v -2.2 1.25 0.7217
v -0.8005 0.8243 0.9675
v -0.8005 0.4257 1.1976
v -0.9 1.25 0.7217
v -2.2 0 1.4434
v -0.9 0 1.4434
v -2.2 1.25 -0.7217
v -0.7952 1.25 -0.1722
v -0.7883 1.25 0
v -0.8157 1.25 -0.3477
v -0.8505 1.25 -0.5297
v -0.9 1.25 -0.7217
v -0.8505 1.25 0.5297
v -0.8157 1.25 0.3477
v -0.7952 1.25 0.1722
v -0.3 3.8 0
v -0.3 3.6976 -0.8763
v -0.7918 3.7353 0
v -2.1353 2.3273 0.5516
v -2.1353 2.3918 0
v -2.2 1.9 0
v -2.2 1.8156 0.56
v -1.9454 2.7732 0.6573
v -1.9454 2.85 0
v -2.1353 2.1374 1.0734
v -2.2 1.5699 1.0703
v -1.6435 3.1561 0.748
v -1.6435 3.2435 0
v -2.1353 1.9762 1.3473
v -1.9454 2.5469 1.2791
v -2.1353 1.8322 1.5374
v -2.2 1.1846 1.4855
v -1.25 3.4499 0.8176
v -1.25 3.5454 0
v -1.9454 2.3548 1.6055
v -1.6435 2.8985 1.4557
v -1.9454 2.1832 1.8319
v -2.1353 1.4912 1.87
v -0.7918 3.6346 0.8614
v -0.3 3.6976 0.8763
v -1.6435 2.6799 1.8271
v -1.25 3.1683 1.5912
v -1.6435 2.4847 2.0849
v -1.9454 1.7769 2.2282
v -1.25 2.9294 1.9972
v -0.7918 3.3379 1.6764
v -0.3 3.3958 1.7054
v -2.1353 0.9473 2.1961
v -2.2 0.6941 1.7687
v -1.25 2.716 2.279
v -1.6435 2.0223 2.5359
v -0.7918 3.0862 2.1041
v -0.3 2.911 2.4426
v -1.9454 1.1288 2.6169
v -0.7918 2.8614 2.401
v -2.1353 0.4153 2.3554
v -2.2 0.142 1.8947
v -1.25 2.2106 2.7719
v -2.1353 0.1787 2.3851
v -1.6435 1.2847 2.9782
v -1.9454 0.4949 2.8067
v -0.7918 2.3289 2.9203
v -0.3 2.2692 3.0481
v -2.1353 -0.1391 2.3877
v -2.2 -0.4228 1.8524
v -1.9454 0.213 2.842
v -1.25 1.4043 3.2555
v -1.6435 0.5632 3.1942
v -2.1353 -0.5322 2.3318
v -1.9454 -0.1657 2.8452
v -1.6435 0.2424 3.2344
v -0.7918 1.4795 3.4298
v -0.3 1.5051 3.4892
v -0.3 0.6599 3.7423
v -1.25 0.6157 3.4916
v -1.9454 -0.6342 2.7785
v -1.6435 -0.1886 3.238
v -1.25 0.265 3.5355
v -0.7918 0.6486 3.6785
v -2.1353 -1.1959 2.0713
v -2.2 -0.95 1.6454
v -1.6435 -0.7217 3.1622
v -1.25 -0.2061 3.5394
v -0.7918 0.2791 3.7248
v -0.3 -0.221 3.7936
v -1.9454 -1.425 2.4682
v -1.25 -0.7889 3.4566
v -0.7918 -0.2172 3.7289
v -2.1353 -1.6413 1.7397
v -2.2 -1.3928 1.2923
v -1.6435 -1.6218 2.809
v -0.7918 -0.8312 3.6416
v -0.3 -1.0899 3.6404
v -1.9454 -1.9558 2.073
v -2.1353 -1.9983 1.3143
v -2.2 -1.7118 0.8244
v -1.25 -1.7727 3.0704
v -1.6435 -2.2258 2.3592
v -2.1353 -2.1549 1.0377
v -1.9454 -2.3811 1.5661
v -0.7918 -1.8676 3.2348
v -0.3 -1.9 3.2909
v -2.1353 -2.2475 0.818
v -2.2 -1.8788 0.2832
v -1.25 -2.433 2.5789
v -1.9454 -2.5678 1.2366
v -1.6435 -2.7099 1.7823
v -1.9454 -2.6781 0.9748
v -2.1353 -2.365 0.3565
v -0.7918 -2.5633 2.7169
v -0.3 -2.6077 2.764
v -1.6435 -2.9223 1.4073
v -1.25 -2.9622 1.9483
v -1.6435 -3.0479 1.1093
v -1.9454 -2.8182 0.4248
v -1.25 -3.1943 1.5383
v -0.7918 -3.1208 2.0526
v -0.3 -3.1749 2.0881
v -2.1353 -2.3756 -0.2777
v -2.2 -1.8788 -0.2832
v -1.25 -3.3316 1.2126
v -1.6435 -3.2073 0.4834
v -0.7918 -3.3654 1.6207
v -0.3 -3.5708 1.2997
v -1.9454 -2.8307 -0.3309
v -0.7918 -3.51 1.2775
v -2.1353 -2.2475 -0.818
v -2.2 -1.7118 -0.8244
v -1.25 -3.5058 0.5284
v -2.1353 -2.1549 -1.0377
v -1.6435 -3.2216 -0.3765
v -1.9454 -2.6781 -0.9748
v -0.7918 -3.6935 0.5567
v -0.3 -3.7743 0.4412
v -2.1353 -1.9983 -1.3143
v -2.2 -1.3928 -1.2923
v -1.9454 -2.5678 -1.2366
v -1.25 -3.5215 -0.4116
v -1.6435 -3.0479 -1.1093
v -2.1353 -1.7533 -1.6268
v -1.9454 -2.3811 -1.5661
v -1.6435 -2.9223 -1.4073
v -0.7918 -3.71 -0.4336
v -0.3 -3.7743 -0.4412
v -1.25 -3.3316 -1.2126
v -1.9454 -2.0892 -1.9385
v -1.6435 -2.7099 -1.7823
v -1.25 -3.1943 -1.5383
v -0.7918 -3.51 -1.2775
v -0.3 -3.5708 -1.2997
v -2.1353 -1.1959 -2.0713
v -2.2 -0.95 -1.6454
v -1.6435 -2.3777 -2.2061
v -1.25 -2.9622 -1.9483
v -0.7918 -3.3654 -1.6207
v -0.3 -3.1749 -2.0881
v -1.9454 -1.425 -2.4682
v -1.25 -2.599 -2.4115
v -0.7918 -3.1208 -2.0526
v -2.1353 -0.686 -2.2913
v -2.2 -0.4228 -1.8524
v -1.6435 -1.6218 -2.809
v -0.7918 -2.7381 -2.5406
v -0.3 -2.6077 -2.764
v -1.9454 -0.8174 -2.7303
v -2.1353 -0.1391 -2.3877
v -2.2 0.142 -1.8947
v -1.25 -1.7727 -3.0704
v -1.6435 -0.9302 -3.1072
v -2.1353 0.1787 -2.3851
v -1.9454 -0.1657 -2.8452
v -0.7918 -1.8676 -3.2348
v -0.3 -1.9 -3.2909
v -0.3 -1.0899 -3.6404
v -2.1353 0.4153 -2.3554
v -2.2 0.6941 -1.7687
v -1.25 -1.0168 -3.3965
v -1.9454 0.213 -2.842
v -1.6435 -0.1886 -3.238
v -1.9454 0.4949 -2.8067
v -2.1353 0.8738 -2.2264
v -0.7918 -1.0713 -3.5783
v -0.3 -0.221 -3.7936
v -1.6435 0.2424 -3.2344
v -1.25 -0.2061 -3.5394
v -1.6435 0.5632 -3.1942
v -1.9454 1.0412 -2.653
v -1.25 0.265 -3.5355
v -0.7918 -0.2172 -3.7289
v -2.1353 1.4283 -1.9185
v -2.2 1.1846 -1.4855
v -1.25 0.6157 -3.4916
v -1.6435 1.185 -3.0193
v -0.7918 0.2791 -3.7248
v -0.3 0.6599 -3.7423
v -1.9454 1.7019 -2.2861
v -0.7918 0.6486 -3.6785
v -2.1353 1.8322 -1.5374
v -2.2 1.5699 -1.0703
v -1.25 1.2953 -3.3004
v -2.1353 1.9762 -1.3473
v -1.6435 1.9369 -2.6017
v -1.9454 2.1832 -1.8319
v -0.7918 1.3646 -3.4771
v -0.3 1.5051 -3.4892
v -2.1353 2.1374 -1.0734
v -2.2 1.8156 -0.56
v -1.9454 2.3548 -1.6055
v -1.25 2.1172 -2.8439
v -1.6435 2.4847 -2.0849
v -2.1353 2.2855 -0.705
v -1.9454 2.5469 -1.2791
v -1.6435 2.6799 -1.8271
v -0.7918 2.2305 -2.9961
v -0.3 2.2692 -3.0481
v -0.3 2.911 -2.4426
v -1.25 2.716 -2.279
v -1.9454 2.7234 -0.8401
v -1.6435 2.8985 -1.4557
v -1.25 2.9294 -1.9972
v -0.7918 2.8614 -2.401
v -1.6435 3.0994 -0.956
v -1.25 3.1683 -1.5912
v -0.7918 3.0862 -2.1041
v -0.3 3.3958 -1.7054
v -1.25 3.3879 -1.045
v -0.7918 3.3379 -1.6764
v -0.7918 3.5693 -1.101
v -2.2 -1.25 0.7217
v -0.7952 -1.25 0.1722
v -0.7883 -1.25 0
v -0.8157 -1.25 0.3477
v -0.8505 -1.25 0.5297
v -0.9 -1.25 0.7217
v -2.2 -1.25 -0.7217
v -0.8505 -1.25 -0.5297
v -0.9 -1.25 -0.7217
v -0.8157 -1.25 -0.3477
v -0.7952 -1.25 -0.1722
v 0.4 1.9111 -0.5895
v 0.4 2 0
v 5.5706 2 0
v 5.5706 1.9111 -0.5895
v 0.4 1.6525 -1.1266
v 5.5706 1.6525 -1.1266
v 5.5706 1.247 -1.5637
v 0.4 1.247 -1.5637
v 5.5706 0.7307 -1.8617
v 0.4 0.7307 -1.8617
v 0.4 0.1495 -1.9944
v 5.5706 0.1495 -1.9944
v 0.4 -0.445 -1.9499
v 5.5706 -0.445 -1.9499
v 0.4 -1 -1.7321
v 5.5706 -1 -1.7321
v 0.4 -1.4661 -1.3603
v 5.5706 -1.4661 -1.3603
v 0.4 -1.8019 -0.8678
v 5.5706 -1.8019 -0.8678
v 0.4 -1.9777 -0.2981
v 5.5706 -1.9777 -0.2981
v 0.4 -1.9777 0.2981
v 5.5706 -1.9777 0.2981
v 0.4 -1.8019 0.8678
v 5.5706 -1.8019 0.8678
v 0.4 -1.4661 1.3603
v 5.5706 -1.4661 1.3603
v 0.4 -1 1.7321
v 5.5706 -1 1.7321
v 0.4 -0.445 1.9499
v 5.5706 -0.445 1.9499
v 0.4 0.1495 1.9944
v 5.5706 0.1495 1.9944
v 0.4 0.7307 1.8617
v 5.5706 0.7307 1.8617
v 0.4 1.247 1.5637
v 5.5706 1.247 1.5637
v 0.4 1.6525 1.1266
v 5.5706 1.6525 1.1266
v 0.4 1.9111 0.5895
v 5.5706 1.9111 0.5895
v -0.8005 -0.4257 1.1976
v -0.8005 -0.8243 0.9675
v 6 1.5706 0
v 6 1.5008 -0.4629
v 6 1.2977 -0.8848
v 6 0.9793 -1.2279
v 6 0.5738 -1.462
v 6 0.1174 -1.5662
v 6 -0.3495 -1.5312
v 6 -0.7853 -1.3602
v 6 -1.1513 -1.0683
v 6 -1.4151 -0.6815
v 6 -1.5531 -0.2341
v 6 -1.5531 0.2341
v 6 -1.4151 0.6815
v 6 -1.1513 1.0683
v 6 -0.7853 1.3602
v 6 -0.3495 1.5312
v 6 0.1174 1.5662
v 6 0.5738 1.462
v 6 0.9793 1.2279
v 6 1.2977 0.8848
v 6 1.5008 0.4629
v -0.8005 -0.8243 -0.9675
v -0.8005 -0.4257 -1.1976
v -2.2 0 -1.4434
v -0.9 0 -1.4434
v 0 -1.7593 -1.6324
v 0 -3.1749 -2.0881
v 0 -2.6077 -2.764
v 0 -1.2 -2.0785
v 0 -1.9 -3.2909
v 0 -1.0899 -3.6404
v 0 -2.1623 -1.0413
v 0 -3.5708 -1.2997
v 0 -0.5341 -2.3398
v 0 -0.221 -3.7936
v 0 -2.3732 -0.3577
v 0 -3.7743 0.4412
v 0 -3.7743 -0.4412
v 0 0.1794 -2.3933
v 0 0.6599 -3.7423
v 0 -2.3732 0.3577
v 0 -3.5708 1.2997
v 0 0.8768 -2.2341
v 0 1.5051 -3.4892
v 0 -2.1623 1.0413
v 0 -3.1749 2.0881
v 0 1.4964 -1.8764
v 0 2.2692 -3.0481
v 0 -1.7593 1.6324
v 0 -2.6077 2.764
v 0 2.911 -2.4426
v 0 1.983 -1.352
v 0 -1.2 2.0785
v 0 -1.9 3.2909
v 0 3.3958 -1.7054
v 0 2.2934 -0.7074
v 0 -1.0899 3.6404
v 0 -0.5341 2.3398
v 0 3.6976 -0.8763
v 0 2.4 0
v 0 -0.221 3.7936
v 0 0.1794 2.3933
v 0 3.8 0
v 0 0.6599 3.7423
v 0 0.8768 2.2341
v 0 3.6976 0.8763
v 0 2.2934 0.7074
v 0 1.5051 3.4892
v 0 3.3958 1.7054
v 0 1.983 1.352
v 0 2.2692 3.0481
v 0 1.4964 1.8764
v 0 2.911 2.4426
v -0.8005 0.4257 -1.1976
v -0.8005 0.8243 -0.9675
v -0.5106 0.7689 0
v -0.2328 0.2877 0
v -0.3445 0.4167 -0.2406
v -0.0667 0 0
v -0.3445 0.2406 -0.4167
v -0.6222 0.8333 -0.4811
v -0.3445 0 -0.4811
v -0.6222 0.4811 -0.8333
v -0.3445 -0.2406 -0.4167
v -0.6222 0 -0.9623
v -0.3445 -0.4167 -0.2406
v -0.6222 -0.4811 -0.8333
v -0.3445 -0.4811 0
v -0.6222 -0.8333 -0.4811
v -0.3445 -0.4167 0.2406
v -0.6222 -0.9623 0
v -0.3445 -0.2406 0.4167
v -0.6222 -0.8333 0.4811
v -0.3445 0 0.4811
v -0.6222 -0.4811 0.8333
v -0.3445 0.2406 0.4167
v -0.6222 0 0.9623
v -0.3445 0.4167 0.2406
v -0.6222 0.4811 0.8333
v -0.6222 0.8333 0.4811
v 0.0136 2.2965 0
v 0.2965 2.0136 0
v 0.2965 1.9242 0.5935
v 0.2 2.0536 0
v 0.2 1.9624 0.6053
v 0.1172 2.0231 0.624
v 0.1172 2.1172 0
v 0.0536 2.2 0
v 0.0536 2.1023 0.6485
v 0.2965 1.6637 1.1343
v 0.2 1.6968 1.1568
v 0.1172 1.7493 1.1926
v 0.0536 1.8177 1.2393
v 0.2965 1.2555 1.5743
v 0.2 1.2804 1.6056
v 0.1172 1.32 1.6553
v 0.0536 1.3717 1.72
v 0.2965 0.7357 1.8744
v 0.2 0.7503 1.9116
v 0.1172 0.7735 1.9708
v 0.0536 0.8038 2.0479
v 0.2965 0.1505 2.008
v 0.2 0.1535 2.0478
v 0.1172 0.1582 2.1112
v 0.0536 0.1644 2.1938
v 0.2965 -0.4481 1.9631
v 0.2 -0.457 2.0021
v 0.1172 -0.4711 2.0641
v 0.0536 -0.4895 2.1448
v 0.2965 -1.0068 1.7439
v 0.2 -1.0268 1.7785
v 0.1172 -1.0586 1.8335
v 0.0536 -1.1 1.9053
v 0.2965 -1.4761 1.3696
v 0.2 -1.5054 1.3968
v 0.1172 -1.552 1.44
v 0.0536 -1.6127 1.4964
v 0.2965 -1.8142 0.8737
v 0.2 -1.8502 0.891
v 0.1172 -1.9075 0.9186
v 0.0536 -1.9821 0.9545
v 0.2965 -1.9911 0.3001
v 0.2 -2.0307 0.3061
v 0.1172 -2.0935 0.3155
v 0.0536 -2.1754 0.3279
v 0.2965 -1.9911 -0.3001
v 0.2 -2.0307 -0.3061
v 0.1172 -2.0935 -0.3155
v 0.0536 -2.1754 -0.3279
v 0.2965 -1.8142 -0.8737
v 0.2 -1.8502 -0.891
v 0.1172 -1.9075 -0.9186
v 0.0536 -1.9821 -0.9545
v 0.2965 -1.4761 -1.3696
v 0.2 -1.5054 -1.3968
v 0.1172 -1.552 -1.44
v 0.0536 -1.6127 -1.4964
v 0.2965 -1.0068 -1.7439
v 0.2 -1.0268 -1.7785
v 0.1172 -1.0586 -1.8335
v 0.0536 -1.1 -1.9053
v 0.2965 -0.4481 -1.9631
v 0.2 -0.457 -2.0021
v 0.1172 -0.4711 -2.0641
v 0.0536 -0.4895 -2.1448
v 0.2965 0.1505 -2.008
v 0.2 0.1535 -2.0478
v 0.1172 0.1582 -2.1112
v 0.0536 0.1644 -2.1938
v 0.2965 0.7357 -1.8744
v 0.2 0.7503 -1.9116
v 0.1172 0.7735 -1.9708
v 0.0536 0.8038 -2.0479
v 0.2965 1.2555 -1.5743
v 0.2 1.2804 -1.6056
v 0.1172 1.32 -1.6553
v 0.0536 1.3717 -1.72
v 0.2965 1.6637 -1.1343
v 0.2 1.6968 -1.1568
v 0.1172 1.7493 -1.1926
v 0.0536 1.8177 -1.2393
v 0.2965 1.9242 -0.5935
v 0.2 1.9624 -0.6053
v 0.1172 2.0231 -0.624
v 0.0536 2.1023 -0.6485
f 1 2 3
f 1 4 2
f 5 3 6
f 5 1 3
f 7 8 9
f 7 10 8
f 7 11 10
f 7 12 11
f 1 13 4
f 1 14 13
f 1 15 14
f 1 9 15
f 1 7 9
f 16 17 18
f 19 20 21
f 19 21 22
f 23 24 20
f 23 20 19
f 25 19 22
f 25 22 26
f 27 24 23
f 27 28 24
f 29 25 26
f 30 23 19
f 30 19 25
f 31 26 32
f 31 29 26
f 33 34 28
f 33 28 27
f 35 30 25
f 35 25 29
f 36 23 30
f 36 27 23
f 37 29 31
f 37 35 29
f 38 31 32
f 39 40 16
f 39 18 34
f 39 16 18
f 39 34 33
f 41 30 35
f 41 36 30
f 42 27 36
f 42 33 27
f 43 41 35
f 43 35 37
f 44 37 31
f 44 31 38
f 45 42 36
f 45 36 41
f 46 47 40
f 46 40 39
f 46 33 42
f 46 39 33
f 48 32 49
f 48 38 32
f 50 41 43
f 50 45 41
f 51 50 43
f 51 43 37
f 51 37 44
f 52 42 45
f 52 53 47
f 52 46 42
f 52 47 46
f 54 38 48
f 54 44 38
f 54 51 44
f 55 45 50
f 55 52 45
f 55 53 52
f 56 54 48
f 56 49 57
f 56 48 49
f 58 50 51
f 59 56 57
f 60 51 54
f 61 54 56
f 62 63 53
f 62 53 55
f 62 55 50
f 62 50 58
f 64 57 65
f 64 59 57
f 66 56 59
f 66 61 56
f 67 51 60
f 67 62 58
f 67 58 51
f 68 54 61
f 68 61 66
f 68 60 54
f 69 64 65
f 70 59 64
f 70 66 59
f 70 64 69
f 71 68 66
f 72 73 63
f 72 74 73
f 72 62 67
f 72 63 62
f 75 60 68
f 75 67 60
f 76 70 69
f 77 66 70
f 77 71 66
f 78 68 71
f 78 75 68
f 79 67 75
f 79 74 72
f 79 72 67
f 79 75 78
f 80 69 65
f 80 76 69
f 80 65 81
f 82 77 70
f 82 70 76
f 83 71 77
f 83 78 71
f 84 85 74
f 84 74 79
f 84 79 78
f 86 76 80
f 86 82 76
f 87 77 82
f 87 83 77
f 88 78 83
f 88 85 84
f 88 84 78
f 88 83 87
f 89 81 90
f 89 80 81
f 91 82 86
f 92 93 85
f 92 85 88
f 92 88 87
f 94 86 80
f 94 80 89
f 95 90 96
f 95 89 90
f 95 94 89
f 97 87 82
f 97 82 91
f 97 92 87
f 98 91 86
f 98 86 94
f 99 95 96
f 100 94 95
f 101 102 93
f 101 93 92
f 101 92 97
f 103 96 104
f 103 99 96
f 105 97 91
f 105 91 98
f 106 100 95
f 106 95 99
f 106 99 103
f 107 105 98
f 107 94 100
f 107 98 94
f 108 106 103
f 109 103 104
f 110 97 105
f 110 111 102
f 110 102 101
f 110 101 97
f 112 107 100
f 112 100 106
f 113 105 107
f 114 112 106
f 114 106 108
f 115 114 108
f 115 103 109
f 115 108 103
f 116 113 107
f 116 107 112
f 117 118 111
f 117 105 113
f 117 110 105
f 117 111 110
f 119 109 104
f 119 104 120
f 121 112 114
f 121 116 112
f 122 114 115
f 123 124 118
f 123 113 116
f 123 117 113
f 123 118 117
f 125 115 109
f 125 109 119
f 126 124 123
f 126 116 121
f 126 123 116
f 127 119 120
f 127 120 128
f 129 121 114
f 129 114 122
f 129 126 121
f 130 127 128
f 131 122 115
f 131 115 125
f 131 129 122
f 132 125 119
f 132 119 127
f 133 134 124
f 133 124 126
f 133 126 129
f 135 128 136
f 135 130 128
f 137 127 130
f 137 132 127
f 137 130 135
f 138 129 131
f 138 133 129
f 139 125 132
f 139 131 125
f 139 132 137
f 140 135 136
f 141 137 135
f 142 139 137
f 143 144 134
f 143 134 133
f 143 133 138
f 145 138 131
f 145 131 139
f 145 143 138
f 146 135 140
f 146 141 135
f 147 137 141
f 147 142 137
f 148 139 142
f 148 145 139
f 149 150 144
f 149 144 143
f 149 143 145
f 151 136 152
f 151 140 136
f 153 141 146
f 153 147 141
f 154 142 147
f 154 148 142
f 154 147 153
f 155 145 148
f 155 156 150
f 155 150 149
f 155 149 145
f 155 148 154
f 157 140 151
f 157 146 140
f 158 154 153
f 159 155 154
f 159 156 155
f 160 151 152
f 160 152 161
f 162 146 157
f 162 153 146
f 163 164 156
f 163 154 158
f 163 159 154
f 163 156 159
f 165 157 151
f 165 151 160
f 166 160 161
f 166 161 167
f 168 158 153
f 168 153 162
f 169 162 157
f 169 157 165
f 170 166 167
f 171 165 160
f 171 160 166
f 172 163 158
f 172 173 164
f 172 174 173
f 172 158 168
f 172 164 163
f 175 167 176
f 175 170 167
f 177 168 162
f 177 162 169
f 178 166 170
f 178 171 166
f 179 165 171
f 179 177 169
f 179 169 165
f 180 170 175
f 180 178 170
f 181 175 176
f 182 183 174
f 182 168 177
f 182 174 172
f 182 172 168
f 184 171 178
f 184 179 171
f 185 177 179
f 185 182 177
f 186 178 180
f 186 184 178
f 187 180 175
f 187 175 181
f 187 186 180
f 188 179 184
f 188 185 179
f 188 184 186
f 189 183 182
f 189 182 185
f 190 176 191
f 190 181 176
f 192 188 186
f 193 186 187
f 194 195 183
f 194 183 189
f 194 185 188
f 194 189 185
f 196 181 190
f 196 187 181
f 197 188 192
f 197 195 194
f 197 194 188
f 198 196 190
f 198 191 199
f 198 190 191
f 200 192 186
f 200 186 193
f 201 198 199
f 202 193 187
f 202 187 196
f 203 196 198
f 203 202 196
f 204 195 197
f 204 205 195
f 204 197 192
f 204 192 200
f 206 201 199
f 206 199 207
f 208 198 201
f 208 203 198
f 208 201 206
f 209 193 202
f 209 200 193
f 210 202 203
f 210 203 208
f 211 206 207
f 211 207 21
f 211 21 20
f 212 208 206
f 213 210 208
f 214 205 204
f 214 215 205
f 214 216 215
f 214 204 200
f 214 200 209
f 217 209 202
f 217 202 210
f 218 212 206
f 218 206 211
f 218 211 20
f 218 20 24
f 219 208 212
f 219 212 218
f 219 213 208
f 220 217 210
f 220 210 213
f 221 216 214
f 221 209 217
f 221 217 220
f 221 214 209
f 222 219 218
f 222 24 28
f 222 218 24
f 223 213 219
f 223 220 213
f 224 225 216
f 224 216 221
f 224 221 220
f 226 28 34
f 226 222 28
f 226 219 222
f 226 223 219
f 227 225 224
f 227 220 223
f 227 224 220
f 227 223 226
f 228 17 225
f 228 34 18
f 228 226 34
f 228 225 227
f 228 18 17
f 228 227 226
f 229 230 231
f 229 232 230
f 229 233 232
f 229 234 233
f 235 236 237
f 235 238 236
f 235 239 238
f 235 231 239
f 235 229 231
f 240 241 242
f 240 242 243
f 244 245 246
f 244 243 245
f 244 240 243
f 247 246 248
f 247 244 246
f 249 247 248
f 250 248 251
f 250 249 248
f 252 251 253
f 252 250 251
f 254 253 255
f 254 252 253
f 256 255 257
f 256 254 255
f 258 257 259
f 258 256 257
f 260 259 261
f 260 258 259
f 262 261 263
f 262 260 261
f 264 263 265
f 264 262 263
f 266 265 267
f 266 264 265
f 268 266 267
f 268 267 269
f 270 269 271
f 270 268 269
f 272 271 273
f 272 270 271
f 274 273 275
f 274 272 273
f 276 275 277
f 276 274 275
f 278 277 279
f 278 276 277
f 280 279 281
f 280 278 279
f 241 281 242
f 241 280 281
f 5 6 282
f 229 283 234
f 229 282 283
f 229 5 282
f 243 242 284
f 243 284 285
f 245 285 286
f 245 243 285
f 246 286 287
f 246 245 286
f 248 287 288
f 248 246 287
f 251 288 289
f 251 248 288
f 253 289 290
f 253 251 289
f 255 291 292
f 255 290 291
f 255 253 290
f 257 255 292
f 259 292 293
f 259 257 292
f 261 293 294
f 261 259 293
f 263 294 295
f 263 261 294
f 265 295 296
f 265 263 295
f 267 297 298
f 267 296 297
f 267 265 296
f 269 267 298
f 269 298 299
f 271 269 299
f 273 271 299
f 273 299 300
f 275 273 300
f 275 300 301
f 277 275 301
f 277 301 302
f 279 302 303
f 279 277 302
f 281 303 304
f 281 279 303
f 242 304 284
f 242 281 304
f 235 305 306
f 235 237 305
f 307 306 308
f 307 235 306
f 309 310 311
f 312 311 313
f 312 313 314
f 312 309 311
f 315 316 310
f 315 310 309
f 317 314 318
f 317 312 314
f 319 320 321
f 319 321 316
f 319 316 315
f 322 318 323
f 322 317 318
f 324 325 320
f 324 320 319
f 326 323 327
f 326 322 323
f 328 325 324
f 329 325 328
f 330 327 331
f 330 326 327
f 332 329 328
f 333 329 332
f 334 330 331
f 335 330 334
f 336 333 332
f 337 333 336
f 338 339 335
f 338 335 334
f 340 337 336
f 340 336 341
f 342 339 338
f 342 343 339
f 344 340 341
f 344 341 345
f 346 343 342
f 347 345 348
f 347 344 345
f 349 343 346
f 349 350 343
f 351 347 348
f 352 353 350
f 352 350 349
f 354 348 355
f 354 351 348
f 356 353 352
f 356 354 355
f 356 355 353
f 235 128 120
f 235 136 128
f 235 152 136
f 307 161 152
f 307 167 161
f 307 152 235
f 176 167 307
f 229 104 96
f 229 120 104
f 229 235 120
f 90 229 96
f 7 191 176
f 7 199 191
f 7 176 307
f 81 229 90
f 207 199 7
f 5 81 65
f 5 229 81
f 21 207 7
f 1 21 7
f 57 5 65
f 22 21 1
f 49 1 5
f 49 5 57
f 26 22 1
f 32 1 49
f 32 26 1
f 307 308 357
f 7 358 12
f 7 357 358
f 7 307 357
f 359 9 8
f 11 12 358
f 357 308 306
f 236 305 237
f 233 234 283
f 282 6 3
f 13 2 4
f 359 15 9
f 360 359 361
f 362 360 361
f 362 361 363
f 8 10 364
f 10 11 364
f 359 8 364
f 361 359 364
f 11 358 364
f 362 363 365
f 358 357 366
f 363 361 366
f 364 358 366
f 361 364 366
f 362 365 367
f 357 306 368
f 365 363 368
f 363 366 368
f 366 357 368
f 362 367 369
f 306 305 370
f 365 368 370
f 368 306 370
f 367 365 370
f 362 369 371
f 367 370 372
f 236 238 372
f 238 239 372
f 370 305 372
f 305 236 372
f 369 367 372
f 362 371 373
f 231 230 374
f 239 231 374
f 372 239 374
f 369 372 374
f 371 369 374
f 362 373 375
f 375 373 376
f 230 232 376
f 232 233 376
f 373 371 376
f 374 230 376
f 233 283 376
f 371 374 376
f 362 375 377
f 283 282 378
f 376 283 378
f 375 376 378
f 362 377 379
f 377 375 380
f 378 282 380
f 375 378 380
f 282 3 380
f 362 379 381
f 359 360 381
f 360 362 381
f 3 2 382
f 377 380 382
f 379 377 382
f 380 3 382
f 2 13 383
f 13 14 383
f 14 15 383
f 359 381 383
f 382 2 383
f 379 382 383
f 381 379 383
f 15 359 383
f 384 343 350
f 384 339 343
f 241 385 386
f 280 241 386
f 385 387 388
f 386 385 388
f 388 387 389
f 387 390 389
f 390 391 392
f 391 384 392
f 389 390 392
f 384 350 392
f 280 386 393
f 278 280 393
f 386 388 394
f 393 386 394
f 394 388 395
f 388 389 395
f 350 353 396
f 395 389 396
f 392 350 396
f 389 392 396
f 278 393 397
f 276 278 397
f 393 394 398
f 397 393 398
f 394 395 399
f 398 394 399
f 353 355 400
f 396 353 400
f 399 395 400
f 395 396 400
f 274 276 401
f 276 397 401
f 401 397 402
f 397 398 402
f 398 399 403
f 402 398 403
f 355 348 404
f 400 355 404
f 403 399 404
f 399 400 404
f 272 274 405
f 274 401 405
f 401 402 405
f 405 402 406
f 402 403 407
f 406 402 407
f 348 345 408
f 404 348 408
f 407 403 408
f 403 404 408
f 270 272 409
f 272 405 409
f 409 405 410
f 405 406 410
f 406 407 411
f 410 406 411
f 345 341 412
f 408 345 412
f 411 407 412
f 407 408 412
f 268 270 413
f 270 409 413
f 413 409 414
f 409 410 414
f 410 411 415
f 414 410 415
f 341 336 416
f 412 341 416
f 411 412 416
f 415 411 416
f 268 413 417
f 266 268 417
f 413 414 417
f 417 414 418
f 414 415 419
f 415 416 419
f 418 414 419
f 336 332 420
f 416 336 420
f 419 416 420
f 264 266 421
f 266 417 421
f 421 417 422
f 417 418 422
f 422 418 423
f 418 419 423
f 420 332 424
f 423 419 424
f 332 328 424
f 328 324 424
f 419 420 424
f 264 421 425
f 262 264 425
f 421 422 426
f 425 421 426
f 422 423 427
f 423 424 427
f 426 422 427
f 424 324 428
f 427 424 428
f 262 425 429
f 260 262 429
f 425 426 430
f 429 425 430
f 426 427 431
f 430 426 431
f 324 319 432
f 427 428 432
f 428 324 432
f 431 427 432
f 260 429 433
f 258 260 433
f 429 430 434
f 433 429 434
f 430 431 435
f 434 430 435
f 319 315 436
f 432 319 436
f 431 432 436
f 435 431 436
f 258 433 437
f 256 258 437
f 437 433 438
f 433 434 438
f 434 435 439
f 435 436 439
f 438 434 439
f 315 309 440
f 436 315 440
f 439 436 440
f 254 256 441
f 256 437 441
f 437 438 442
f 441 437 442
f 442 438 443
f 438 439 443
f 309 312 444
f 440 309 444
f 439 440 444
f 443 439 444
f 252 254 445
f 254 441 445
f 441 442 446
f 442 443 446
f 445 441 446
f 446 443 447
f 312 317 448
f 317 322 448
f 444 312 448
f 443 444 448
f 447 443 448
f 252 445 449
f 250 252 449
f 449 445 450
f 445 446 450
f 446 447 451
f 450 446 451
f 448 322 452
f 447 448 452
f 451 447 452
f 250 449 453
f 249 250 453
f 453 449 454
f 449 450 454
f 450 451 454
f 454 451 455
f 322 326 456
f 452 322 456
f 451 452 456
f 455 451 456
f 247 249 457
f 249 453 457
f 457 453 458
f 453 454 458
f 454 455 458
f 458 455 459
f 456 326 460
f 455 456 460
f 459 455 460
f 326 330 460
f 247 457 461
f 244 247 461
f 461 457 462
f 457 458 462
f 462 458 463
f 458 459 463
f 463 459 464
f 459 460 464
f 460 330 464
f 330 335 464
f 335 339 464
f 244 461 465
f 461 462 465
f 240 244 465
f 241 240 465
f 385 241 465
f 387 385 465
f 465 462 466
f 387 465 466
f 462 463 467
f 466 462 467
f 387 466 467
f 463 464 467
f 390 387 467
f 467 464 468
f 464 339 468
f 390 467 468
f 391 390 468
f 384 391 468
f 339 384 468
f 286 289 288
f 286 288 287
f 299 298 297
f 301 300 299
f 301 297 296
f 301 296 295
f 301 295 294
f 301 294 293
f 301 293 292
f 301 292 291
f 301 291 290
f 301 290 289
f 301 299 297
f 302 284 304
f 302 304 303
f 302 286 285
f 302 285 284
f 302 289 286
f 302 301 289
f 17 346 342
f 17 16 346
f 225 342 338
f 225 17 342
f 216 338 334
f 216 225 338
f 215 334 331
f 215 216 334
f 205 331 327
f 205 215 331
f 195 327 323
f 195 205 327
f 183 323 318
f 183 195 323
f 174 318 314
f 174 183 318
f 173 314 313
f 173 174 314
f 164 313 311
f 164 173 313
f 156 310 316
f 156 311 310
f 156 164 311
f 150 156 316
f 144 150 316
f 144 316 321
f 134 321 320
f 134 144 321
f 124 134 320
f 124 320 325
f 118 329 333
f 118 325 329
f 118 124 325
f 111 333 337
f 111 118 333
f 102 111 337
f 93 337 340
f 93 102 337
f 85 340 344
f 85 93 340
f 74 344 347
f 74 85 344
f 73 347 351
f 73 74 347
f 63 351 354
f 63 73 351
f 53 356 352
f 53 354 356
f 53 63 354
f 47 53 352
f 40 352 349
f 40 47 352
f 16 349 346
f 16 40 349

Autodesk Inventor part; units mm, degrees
ref_plane "YZ Plane" through (0, 0, 0) normal (1, 0, 0) x (0, 1, 0)
ref_plane "XZ Plane" through (0, 0, 0) normal (0, 1, 0) x (-1, 0, 0)
sketch "Sketch1" plane through (0, 0, 0) normal (0, 0, 1) x (1, 0, 0)
  line L0 (-0.0667, 0) -> (6, 0)
  line L1 (6, 0) -> (6, 2)
  line L2 (6, 2) -> (2.1, 2)
  line L3 (2.1, 2) -> (1.6705, 2)
  line L4 (1.6705, 2) -> (0, 2)
  line L5 (0, 2) -> (0, 3.8)
  line L6 (0, 3.8) -> (-2.2, 3.8)
  line L7 (-2.2, 3.8) -> (-2.2, 1.4434)
  line L8 (-2.2, 1.4434) -> (-0.9, 1.4434)
  line L9 (-0.9, 1.4434) -> (-0.0667, 0)
  line L10 (-3.84, 0) -> (7.64, 0) projected
  line L11 (0, -0.76) -> (0, 4.56) projected
  line L12 (2.1, 2) -> (0, 2) construction
  dimension "d1" = 3.9
  dimension "d2" = 0.4295
  dimension "d3" = 2.2
  dimension "d4" = 1.3
  dimension "d5" = 60
  dimension "d6" = 4
  dimension "d7" = 4
  dimension "d8" = 2.8868
  dimension "d9" = 7.6
  dimension "d26" = 6
revolve "Body" add sketch "Sketch1" angle 360 about axis through (-0.0667, 0, 0) along (1, 0, 0)
sketch "Sketch2" plane through (-2.2, 0, 0) normal (-1, 0, 0) x (0, 0, 1)
  circle A0 centre (0, 0) radius 1.4434 projected
  line L0 (0, -5.32) -> (0, 5.32) projected
  line L1 (-5.32, 0) -> (5.32, 0) projected
  line L2 (1.4434, 0) -> (0.7217, -1.25)
  line L3 (0.7217, -1.25) -> (-0.7217, -1.25)
  line L4 (-0.7217, -1.25) -> (-1.4434, 0)
  line L5 (-1.4434, 0) -> (-0.7217, 1.25)
  line L6 (-0.7217, 1.25) -> (0.7217, 1.25)
  line L7 (0.7217, 1.25) -> (1.4434, 0)
  point P0 (0, 0)
extrude "Slot" add sketch "Sketch2" against normal up to next contours L7 A0 | A0 L2 | L6 L0 A0 | A0 L0 L3 | L0 L6 A0 | A0 L3 L0 | L4 A0 | A0 L5
fillet "Fillet1" radius 1.9 1 edges at (-2.2, -3.8, 0)
thread "Thread" size "M4x0.7" class "6g" standard "ISO Metric profile" length 3.9
chamfer "Chamfer1" distance 0.4294 distance2 0.4294 1 edges at (6, -2, 0) measured on face at (6, 0.556, 0.0273)
ref_plane "Work Plane1" through (29, 0, 0) normal (0, -1, 0) x (1, 0, 0)
fillet "Fillet2" radius 0.4 1 edges at (0, -2, 0)
equation "\"d1\" = GEL"
equation "\"d3\" = KOH"
equation "\"d4\" = INTI"
equation "\"d6\" = GD"
equation "\"d7\" = BDM"
equation "\"d8\" = 1.1547 * SW"
equation "\"d9\" = KOD"
equation "\"d26\" = NLG"
equation "\"d30\" = R"
equation "\"d17\" = RR"
equation "\"d13\" = GEL"
equation "\"d15\" = -0.5 * SPD + 0.5 * GD"
equation "\"d16\" = GUL"
equation "\"GD\" = NND"
equation "\"NLG\" = 6"
equation "\"GEL\" = 3.9"
equation "\"KOD\" = 7.6"
equation "\"KOH\" = 2.2"
equation "\"INTI\" = 1.3"
equation "\"GAL\" = 0.61345 * PTC"
equation "\"GUL\" = 0.61345 * PTC"
equation "\"BDM\" = NND"
equation "\"SW\" = 2.5"
equation "\"RR\" = 1.9"
equation "\"SPD\" = NND - 1.2269 * PTC"
equation "\"R\" = 0.4"
equation "\"TOA\" = 30deg"
equation "\"GD1\" = THREADDIA - 1.2269 * PTC"
equation "\"THREADDIA\" = 4"
equation "\"PTC\" = 0.7"
equation "\"NND\" = 4"
equation "\"KOH1\" = 0.3"
equation "\"E0\" = 2.873"
properties part number "ISO 7380-1 - M4 x 6" material "Steel"
